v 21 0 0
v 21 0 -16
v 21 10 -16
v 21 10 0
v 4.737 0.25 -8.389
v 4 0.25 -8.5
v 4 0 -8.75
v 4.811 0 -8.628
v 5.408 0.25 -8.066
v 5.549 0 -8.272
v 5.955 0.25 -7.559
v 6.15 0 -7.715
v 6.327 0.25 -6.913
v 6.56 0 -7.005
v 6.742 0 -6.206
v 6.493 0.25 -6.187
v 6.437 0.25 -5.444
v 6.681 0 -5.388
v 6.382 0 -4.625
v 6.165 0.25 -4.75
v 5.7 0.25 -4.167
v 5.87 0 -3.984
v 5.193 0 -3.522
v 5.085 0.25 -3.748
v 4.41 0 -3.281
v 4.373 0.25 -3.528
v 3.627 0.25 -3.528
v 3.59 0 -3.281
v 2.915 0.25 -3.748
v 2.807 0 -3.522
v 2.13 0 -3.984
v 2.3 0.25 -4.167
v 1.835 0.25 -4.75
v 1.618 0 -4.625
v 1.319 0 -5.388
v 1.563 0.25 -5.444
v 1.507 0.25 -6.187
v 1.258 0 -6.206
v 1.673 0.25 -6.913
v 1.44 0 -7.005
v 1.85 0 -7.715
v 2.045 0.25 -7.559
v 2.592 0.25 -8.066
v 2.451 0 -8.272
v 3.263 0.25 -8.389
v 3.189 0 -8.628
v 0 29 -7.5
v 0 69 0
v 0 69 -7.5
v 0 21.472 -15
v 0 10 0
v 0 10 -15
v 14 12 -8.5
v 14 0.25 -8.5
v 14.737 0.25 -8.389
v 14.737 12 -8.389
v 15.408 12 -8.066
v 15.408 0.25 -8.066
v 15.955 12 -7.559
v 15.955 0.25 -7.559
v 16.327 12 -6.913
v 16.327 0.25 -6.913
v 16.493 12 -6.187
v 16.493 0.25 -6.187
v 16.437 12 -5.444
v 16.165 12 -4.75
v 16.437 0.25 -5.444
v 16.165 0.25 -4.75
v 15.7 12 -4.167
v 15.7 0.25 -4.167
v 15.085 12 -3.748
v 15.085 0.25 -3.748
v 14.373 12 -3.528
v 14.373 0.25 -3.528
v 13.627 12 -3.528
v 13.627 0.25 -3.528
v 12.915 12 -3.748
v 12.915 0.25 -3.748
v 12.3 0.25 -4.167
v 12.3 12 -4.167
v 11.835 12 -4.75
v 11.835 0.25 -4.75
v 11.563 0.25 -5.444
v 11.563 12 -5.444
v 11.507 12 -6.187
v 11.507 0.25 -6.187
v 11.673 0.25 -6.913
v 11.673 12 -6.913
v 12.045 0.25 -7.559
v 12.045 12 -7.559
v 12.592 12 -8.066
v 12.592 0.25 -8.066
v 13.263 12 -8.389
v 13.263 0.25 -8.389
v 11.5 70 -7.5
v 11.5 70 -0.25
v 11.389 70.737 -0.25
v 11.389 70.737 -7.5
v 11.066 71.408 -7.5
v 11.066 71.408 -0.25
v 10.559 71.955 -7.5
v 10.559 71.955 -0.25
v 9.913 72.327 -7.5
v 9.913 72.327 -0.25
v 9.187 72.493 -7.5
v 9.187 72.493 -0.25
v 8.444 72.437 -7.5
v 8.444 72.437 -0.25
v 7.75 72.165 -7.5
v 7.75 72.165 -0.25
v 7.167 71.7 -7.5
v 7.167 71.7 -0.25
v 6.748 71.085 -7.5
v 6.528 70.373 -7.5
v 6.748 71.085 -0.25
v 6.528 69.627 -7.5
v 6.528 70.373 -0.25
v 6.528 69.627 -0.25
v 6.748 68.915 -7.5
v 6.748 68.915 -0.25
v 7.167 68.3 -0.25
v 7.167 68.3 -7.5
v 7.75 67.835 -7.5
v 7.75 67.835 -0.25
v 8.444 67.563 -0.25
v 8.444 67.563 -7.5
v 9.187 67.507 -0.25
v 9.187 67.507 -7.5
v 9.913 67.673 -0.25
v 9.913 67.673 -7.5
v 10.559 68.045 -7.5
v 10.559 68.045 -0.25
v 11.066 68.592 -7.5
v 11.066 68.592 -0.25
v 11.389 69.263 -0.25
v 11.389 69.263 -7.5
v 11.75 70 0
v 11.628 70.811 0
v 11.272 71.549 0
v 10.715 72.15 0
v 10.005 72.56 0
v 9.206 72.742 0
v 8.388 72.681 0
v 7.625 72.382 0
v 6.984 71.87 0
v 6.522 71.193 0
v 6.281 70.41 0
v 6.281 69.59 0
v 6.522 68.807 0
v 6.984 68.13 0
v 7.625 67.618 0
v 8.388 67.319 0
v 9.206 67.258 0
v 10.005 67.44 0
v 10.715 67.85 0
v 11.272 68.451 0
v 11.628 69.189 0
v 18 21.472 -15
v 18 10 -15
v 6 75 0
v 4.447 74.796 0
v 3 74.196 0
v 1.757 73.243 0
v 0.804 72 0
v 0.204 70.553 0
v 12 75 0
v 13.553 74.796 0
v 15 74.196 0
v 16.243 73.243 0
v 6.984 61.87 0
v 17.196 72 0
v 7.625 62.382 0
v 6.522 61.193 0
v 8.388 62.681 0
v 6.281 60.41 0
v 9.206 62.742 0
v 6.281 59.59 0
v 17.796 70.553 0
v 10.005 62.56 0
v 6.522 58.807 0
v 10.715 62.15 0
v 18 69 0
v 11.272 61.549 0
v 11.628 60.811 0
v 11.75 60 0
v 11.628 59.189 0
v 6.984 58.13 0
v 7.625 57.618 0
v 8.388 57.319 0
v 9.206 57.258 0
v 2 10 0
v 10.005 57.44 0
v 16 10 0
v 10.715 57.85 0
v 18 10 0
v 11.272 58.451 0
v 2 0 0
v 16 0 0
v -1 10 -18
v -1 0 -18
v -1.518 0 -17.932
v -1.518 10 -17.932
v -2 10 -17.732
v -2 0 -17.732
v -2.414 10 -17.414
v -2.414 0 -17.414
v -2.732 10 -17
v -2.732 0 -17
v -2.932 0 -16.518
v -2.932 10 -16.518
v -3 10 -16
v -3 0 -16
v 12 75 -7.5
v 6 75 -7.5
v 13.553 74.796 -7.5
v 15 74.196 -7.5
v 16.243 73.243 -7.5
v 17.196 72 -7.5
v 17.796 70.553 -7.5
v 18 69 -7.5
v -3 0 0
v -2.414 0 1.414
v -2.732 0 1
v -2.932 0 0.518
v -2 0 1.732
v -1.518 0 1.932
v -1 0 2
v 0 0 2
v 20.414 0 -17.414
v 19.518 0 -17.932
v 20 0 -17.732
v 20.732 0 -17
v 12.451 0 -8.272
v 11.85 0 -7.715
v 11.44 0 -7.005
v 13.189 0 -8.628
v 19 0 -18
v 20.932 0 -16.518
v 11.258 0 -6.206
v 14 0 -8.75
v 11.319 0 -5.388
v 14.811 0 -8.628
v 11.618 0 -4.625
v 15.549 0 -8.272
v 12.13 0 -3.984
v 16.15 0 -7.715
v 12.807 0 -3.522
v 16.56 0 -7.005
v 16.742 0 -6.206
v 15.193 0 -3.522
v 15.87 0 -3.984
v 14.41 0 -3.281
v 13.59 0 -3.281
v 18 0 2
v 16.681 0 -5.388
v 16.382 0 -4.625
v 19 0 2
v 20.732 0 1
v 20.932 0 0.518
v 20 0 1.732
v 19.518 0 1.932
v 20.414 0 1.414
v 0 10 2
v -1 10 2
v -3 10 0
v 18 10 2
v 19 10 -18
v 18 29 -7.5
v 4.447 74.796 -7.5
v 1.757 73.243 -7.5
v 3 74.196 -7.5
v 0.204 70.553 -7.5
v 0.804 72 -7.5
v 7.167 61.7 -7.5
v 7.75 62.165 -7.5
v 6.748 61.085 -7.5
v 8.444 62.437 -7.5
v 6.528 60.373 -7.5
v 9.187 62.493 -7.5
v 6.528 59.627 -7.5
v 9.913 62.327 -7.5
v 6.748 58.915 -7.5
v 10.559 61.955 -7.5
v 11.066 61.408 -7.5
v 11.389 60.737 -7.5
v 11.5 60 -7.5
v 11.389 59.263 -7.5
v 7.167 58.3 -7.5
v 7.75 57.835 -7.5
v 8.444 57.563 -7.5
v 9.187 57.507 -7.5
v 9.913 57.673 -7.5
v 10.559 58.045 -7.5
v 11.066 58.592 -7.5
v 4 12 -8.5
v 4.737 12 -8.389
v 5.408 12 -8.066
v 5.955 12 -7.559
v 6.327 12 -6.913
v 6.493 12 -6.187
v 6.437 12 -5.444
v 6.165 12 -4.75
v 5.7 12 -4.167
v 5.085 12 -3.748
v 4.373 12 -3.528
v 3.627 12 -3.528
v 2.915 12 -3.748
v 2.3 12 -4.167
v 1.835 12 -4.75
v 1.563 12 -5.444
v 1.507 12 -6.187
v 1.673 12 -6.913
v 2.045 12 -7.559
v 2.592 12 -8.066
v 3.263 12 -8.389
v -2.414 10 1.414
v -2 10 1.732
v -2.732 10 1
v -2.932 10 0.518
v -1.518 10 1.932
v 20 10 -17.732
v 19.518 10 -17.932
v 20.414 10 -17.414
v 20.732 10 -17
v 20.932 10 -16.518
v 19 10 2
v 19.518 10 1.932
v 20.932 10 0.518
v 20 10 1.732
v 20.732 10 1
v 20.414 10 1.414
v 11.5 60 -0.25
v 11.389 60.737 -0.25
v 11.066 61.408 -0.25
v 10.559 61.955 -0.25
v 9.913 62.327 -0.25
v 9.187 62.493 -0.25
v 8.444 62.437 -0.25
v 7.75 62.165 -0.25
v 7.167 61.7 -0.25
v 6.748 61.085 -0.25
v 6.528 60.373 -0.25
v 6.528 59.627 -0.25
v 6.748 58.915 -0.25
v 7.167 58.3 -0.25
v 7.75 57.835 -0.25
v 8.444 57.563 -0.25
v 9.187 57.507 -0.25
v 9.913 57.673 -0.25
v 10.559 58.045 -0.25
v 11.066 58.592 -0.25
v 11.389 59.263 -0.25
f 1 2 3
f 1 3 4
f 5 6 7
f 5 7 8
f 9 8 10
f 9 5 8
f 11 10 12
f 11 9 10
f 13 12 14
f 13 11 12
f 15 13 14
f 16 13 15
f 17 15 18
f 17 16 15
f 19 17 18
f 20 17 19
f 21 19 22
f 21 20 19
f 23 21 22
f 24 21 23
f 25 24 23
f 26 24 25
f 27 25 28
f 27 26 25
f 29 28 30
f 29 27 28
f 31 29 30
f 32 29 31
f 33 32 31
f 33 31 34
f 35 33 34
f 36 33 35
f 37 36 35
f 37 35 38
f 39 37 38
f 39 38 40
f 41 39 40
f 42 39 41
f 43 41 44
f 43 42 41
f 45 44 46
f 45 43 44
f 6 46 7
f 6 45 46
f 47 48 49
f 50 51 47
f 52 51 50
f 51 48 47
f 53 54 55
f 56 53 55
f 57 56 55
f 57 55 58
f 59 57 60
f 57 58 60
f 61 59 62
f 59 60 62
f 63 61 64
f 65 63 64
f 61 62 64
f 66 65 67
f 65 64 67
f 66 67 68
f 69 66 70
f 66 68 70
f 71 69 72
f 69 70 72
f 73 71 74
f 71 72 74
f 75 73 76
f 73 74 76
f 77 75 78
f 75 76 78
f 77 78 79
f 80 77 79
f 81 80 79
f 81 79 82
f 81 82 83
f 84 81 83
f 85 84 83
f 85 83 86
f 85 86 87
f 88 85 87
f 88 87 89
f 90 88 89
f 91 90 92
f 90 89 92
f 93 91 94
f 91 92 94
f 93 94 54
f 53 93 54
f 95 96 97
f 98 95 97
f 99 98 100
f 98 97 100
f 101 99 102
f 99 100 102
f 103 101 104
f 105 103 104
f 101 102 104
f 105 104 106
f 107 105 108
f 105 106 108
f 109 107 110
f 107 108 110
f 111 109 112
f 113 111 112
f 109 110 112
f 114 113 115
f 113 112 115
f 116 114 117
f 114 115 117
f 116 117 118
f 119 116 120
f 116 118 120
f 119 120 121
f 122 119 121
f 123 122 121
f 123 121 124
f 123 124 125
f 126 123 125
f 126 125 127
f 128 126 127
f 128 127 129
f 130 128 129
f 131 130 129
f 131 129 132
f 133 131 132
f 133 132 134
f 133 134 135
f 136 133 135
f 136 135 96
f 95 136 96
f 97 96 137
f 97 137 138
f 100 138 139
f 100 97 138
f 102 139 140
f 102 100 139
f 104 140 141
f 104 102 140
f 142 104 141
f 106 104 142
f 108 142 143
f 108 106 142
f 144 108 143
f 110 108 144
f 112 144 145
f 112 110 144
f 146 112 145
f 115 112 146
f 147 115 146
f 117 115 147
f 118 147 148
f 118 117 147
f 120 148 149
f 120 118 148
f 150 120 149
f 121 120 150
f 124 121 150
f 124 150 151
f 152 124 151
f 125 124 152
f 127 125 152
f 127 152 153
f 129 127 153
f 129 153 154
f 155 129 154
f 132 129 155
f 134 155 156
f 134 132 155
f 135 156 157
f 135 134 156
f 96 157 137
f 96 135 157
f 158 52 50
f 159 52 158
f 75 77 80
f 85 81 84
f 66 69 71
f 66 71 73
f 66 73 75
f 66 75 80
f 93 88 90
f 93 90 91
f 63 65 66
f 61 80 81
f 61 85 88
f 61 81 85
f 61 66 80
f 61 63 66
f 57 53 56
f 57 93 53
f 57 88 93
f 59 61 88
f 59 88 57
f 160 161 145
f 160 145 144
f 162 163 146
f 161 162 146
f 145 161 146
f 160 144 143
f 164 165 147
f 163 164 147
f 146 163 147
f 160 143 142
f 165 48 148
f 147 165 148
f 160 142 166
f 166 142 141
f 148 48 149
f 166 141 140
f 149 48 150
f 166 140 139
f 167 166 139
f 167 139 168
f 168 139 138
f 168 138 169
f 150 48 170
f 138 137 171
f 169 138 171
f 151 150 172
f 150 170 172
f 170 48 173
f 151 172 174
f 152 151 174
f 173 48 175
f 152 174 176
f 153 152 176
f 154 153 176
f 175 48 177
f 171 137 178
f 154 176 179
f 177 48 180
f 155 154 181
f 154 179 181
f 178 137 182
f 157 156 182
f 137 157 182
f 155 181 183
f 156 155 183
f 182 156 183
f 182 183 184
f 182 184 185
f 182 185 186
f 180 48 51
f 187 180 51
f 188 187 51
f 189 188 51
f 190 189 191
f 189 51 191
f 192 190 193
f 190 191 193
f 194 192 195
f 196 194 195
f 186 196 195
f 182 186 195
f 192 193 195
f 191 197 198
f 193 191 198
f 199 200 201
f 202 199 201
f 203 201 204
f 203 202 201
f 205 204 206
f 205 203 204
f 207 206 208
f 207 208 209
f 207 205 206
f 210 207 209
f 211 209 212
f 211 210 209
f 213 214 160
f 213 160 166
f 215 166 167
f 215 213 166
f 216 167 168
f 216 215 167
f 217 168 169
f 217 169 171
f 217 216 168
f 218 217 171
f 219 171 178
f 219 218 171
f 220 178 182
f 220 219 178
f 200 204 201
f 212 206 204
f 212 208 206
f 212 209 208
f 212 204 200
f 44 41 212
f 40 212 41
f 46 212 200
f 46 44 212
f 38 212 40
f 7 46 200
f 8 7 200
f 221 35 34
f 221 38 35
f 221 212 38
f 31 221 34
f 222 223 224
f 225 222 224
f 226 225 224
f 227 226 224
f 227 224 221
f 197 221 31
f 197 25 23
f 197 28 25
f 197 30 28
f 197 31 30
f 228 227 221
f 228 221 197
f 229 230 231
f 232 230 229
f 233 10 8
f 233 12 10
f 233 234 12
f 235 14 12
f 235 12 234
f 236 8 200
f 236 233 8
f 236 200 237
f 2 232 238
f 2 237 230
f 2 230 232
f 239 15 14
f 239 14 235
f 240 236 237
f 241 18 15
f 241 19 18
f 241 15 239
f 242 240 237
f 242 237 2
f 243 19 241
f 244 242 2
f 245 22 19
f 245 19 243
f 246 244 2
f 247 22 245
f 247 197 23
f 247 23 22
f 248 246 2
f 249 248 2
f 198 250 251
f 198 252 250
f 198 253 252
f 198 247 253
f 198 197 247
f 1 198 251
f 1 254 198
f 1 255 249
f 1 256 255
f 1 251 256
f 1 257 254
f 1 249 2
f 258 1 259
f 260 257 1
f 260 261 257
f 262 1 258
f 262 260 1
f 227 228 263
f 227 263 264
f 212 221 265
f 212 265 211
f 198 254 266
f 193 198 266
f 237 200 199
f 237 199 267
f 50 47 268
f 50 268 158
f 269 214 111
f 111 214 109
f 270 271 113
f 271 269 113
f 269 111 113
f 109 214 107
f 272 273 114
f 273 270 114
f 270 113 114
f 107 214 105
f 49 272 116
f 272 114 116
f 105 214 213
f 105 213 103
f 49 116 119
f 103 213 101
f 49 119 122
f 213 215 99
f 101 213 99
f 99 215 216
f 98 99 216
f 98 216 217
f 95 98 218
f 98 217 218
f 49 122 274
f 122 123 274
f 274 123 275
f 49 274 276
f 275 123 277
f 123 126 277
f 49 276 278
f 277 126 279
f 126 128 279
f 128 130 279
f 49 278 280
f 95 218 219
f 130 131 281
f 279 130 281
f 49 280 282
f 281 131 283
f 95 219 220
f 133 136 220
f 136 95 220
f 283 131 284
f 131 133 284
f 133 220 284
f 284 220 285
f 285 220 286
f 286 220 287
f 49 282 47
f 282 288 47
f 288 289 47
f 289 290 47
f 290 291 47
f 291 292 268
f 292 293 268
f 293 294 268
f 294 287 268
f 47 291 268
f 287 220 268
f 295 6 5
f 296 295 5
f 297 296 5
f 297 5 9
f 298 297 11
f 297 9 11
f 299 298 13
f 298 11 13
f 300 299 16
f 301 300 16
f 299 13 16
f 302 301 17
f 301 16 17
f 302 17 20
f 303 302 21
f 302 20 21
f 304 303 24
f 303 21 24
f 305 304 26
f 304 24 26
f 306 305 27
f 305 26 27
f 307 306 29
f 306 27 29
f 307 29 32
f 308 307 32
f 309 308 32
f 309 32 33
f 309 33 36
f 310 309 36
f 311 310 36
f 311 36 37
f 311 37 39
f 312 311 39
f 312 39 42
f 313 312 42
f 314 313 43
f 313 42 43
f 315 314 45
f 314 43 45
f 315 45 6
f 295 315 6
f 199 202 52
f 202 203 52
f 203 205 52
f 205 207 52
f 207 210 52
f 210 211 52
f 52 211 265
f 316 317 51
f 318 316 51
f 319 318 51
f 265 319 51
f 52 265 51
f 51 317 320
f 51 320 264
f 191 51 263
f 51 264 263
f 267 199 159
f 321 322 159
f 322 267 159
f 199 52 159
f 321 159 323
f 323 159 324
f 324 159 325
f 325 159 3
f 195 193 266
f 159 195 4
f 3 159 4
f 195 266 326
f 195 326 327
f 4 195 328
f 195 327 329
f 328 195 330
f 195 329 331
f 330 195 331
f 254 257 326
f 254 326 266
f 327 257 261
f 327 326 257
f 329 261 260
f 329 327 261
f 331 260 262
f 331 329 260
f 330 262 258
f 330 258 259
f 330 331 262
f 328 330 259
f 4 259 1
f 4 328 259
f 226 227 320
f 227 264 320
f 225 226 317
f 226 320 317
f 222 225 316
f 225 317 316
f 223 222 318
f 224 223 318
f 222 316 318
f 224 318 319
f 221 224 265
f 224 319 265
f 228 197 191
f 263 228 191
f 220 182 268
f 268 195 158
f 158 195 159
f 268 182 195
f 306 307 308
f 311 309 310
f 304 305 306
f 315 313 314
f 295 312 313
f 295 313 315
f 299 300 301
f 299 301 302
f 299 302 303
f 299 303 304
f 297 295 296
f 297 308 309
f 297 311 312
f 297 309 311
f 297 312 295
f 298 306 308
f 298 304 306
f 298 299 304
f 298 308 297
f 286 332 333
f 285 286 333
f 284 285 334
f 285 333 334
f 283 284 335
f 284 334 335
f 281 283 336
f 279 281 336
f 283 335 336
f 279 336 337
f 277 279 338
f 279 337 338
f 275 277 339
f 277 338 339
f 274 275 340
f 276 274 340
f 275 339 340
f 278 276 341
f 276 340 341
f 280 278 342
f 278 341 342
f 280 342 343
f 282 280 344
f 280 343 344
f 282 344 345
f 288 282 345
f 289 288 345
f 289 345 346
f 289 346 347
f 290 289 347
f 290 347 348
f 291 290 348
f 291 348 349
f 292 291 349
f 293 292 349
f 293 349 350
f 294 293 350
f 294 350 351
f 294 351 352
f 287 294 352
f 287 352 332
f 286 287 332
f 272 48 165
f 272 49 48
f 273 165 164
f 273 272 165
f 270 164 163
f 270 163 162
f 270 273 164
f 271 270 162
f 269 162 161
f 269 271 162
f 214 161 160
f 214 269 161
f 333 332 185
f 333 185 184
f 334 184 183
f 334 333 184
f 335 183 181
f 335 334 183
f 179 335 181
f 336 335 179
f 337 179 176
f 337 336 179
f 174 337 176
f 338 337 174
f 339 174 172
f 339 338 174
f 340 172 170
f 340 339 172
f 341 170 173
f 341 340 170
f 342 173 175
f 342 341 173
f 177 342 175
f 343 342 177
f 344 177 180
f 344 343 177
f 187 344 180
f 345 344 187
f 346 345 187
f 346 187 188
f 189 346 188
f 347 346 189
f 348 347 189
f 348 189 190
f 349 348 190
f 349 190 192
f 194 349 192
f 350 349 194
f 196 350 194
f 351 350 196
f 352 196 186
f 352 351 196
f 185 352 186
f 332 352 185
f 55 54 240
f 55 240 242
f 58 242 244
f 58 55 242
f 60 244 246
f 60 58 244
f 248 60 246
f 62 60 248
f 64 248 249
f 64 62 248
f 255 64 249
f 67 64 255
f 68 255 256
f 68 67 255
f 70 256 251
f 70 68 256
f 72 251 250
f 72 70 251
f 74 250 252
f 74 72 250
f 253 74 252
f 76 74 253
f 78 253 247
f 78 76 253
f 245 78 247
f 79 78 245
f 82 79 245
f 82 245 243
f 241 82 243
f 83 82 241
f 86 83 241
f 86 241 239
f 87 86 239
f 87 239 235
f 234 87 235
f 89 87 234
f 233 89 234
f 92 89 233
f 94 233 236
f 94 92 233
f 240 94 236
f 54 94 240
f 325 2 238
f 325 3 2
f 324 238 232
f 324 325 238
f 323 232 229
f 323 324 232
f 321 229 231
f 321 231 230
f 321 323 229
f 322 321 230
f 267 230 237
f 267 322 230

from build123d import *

# Parameters (mm, degrees)
SKETCH1_W           = 18
SKETCH1_H           = 15
BOSS_EXTRUDE1_DEPTH = 75
SKETCH2_R           = 2.5
CUT_EXTRUDE1_DEPTH  = 12
CUT_EXTRUDE2_DEPTH  = 48
SKETCH4_R           = 2.5
CUT_EXTRUDE3_DEPTH  = 48
FILLET1_R           = 6
BOSS_EXTRUDE2_DEPTH = 10
CHAMFER3_SIZE       = 2
FILLET2_R           = 2
CHAMFER4_SIZE       = 0.25


with BuildPart() as part:
    # Sketch1 → Boss-Extrude1 (new body)
    with BuildSketch(Plane(origin=(0, 0, 0), x_dir=(1, 0, 0), z_dir=(0, 1, 0))):
        with Locations((9, 7.5)):
            Rectangle(SKETCH1_W, SKETCH1_H)
    extrude(amount=BOSS_EXTRUDE1_DEPTH)

    # Sketch2 → Cut-Extrude1 (cut)
    with BuildSketch(Plane.XZ):
        with Locations(Location((14, -6, 0), (0, 0, 270))):
            Circle(SKETCH2_R)
        with Locations(Location((4, -6, 0), (0, 0, 270))):
            Circle(SKETCH2_R)
    extrude(amount=-CUT_EXTRUDE1_DEPTH, mode=Mode.SUBTRACT)

    # Sketch3 → Cut-Extrude2 (cut)
    with BuildSketch(Plane(origin=(18, 0, 0), x_dir=(0, 0, -1), z_dir=(1, 0, 0))):
        Polygon((7.5, 75), (7.5, 29), (15, 21.472065282), (15, 75), align=None)
    extrude(amount=-CUT_EXTRUDE2_DEPTH, mode=Mode.SUBTRACT)

    # Sketch4 → Cut-Extrude3 (cut)
    with BuildSketch(Plane.XY):
        with Locations((9, 70)):
            Circle(SKETCH4_R)
        with Locations((9, 60)):
            Circle(SKETCH4_R)
    extrude(amount=-CUT_EXTRUDE3_DEPTH, mode=Mode.SUBTRACT)

    # Fillet1
    fillet1_edges = [part.edges().sort_by_distance(p)[0] for p in [
        (18, 75, -3.75),
        (0, 75, -3.75),
    ]]
    fillet(fillet1_edges, radius=FILLET1_R)

    # Sketch5 → Boss-Extrude2 (add)
    with BuildSketch(Plane.XZ):
        Polygon((0, 0), (0, 2), (-3, 2), (-3, -18), (21, -18), (21, 2), (18, 2), (18, 0), (18, -15), (0, -15), align=None)
    extrude(amount=-BOSS_EXTRUDE2_DEPTH)

    # Chamfer3
    chamfer3_edges = [part.edges().sort_by_distance(p)[0] for p in [
        (0, 5, 0),
        (18, 5, 0),
    ]]
    chamfer(chamfer3_edges, length=CHAMFER3_SIZE - 0.0001)  # a hair under: the kernel refuses the full size

    # Fillet2
    fillet2_edges = [part.edges().sort_by_distance(p)[0] for p in [
        (21, 5, 2),
        (21, 5, -18),
        (-3, 5, -18),
        (-3, 5, 2),
    ]]
    fillet(fillet2_edges, radius=FILLET2_R)

    # Chamfer4
    chamfer4_edges = [part.edges().sort_by_distance(p)[0] for p in [
        (4, 0, -3.5),
        (14, 0, -3.5),
        (6.5, 70, 0),
        (6.5, 60, 0),
    ]]
    chamfer(chamfer4_edges, length=CHAMFER4_SIZE)


solid = part.part
